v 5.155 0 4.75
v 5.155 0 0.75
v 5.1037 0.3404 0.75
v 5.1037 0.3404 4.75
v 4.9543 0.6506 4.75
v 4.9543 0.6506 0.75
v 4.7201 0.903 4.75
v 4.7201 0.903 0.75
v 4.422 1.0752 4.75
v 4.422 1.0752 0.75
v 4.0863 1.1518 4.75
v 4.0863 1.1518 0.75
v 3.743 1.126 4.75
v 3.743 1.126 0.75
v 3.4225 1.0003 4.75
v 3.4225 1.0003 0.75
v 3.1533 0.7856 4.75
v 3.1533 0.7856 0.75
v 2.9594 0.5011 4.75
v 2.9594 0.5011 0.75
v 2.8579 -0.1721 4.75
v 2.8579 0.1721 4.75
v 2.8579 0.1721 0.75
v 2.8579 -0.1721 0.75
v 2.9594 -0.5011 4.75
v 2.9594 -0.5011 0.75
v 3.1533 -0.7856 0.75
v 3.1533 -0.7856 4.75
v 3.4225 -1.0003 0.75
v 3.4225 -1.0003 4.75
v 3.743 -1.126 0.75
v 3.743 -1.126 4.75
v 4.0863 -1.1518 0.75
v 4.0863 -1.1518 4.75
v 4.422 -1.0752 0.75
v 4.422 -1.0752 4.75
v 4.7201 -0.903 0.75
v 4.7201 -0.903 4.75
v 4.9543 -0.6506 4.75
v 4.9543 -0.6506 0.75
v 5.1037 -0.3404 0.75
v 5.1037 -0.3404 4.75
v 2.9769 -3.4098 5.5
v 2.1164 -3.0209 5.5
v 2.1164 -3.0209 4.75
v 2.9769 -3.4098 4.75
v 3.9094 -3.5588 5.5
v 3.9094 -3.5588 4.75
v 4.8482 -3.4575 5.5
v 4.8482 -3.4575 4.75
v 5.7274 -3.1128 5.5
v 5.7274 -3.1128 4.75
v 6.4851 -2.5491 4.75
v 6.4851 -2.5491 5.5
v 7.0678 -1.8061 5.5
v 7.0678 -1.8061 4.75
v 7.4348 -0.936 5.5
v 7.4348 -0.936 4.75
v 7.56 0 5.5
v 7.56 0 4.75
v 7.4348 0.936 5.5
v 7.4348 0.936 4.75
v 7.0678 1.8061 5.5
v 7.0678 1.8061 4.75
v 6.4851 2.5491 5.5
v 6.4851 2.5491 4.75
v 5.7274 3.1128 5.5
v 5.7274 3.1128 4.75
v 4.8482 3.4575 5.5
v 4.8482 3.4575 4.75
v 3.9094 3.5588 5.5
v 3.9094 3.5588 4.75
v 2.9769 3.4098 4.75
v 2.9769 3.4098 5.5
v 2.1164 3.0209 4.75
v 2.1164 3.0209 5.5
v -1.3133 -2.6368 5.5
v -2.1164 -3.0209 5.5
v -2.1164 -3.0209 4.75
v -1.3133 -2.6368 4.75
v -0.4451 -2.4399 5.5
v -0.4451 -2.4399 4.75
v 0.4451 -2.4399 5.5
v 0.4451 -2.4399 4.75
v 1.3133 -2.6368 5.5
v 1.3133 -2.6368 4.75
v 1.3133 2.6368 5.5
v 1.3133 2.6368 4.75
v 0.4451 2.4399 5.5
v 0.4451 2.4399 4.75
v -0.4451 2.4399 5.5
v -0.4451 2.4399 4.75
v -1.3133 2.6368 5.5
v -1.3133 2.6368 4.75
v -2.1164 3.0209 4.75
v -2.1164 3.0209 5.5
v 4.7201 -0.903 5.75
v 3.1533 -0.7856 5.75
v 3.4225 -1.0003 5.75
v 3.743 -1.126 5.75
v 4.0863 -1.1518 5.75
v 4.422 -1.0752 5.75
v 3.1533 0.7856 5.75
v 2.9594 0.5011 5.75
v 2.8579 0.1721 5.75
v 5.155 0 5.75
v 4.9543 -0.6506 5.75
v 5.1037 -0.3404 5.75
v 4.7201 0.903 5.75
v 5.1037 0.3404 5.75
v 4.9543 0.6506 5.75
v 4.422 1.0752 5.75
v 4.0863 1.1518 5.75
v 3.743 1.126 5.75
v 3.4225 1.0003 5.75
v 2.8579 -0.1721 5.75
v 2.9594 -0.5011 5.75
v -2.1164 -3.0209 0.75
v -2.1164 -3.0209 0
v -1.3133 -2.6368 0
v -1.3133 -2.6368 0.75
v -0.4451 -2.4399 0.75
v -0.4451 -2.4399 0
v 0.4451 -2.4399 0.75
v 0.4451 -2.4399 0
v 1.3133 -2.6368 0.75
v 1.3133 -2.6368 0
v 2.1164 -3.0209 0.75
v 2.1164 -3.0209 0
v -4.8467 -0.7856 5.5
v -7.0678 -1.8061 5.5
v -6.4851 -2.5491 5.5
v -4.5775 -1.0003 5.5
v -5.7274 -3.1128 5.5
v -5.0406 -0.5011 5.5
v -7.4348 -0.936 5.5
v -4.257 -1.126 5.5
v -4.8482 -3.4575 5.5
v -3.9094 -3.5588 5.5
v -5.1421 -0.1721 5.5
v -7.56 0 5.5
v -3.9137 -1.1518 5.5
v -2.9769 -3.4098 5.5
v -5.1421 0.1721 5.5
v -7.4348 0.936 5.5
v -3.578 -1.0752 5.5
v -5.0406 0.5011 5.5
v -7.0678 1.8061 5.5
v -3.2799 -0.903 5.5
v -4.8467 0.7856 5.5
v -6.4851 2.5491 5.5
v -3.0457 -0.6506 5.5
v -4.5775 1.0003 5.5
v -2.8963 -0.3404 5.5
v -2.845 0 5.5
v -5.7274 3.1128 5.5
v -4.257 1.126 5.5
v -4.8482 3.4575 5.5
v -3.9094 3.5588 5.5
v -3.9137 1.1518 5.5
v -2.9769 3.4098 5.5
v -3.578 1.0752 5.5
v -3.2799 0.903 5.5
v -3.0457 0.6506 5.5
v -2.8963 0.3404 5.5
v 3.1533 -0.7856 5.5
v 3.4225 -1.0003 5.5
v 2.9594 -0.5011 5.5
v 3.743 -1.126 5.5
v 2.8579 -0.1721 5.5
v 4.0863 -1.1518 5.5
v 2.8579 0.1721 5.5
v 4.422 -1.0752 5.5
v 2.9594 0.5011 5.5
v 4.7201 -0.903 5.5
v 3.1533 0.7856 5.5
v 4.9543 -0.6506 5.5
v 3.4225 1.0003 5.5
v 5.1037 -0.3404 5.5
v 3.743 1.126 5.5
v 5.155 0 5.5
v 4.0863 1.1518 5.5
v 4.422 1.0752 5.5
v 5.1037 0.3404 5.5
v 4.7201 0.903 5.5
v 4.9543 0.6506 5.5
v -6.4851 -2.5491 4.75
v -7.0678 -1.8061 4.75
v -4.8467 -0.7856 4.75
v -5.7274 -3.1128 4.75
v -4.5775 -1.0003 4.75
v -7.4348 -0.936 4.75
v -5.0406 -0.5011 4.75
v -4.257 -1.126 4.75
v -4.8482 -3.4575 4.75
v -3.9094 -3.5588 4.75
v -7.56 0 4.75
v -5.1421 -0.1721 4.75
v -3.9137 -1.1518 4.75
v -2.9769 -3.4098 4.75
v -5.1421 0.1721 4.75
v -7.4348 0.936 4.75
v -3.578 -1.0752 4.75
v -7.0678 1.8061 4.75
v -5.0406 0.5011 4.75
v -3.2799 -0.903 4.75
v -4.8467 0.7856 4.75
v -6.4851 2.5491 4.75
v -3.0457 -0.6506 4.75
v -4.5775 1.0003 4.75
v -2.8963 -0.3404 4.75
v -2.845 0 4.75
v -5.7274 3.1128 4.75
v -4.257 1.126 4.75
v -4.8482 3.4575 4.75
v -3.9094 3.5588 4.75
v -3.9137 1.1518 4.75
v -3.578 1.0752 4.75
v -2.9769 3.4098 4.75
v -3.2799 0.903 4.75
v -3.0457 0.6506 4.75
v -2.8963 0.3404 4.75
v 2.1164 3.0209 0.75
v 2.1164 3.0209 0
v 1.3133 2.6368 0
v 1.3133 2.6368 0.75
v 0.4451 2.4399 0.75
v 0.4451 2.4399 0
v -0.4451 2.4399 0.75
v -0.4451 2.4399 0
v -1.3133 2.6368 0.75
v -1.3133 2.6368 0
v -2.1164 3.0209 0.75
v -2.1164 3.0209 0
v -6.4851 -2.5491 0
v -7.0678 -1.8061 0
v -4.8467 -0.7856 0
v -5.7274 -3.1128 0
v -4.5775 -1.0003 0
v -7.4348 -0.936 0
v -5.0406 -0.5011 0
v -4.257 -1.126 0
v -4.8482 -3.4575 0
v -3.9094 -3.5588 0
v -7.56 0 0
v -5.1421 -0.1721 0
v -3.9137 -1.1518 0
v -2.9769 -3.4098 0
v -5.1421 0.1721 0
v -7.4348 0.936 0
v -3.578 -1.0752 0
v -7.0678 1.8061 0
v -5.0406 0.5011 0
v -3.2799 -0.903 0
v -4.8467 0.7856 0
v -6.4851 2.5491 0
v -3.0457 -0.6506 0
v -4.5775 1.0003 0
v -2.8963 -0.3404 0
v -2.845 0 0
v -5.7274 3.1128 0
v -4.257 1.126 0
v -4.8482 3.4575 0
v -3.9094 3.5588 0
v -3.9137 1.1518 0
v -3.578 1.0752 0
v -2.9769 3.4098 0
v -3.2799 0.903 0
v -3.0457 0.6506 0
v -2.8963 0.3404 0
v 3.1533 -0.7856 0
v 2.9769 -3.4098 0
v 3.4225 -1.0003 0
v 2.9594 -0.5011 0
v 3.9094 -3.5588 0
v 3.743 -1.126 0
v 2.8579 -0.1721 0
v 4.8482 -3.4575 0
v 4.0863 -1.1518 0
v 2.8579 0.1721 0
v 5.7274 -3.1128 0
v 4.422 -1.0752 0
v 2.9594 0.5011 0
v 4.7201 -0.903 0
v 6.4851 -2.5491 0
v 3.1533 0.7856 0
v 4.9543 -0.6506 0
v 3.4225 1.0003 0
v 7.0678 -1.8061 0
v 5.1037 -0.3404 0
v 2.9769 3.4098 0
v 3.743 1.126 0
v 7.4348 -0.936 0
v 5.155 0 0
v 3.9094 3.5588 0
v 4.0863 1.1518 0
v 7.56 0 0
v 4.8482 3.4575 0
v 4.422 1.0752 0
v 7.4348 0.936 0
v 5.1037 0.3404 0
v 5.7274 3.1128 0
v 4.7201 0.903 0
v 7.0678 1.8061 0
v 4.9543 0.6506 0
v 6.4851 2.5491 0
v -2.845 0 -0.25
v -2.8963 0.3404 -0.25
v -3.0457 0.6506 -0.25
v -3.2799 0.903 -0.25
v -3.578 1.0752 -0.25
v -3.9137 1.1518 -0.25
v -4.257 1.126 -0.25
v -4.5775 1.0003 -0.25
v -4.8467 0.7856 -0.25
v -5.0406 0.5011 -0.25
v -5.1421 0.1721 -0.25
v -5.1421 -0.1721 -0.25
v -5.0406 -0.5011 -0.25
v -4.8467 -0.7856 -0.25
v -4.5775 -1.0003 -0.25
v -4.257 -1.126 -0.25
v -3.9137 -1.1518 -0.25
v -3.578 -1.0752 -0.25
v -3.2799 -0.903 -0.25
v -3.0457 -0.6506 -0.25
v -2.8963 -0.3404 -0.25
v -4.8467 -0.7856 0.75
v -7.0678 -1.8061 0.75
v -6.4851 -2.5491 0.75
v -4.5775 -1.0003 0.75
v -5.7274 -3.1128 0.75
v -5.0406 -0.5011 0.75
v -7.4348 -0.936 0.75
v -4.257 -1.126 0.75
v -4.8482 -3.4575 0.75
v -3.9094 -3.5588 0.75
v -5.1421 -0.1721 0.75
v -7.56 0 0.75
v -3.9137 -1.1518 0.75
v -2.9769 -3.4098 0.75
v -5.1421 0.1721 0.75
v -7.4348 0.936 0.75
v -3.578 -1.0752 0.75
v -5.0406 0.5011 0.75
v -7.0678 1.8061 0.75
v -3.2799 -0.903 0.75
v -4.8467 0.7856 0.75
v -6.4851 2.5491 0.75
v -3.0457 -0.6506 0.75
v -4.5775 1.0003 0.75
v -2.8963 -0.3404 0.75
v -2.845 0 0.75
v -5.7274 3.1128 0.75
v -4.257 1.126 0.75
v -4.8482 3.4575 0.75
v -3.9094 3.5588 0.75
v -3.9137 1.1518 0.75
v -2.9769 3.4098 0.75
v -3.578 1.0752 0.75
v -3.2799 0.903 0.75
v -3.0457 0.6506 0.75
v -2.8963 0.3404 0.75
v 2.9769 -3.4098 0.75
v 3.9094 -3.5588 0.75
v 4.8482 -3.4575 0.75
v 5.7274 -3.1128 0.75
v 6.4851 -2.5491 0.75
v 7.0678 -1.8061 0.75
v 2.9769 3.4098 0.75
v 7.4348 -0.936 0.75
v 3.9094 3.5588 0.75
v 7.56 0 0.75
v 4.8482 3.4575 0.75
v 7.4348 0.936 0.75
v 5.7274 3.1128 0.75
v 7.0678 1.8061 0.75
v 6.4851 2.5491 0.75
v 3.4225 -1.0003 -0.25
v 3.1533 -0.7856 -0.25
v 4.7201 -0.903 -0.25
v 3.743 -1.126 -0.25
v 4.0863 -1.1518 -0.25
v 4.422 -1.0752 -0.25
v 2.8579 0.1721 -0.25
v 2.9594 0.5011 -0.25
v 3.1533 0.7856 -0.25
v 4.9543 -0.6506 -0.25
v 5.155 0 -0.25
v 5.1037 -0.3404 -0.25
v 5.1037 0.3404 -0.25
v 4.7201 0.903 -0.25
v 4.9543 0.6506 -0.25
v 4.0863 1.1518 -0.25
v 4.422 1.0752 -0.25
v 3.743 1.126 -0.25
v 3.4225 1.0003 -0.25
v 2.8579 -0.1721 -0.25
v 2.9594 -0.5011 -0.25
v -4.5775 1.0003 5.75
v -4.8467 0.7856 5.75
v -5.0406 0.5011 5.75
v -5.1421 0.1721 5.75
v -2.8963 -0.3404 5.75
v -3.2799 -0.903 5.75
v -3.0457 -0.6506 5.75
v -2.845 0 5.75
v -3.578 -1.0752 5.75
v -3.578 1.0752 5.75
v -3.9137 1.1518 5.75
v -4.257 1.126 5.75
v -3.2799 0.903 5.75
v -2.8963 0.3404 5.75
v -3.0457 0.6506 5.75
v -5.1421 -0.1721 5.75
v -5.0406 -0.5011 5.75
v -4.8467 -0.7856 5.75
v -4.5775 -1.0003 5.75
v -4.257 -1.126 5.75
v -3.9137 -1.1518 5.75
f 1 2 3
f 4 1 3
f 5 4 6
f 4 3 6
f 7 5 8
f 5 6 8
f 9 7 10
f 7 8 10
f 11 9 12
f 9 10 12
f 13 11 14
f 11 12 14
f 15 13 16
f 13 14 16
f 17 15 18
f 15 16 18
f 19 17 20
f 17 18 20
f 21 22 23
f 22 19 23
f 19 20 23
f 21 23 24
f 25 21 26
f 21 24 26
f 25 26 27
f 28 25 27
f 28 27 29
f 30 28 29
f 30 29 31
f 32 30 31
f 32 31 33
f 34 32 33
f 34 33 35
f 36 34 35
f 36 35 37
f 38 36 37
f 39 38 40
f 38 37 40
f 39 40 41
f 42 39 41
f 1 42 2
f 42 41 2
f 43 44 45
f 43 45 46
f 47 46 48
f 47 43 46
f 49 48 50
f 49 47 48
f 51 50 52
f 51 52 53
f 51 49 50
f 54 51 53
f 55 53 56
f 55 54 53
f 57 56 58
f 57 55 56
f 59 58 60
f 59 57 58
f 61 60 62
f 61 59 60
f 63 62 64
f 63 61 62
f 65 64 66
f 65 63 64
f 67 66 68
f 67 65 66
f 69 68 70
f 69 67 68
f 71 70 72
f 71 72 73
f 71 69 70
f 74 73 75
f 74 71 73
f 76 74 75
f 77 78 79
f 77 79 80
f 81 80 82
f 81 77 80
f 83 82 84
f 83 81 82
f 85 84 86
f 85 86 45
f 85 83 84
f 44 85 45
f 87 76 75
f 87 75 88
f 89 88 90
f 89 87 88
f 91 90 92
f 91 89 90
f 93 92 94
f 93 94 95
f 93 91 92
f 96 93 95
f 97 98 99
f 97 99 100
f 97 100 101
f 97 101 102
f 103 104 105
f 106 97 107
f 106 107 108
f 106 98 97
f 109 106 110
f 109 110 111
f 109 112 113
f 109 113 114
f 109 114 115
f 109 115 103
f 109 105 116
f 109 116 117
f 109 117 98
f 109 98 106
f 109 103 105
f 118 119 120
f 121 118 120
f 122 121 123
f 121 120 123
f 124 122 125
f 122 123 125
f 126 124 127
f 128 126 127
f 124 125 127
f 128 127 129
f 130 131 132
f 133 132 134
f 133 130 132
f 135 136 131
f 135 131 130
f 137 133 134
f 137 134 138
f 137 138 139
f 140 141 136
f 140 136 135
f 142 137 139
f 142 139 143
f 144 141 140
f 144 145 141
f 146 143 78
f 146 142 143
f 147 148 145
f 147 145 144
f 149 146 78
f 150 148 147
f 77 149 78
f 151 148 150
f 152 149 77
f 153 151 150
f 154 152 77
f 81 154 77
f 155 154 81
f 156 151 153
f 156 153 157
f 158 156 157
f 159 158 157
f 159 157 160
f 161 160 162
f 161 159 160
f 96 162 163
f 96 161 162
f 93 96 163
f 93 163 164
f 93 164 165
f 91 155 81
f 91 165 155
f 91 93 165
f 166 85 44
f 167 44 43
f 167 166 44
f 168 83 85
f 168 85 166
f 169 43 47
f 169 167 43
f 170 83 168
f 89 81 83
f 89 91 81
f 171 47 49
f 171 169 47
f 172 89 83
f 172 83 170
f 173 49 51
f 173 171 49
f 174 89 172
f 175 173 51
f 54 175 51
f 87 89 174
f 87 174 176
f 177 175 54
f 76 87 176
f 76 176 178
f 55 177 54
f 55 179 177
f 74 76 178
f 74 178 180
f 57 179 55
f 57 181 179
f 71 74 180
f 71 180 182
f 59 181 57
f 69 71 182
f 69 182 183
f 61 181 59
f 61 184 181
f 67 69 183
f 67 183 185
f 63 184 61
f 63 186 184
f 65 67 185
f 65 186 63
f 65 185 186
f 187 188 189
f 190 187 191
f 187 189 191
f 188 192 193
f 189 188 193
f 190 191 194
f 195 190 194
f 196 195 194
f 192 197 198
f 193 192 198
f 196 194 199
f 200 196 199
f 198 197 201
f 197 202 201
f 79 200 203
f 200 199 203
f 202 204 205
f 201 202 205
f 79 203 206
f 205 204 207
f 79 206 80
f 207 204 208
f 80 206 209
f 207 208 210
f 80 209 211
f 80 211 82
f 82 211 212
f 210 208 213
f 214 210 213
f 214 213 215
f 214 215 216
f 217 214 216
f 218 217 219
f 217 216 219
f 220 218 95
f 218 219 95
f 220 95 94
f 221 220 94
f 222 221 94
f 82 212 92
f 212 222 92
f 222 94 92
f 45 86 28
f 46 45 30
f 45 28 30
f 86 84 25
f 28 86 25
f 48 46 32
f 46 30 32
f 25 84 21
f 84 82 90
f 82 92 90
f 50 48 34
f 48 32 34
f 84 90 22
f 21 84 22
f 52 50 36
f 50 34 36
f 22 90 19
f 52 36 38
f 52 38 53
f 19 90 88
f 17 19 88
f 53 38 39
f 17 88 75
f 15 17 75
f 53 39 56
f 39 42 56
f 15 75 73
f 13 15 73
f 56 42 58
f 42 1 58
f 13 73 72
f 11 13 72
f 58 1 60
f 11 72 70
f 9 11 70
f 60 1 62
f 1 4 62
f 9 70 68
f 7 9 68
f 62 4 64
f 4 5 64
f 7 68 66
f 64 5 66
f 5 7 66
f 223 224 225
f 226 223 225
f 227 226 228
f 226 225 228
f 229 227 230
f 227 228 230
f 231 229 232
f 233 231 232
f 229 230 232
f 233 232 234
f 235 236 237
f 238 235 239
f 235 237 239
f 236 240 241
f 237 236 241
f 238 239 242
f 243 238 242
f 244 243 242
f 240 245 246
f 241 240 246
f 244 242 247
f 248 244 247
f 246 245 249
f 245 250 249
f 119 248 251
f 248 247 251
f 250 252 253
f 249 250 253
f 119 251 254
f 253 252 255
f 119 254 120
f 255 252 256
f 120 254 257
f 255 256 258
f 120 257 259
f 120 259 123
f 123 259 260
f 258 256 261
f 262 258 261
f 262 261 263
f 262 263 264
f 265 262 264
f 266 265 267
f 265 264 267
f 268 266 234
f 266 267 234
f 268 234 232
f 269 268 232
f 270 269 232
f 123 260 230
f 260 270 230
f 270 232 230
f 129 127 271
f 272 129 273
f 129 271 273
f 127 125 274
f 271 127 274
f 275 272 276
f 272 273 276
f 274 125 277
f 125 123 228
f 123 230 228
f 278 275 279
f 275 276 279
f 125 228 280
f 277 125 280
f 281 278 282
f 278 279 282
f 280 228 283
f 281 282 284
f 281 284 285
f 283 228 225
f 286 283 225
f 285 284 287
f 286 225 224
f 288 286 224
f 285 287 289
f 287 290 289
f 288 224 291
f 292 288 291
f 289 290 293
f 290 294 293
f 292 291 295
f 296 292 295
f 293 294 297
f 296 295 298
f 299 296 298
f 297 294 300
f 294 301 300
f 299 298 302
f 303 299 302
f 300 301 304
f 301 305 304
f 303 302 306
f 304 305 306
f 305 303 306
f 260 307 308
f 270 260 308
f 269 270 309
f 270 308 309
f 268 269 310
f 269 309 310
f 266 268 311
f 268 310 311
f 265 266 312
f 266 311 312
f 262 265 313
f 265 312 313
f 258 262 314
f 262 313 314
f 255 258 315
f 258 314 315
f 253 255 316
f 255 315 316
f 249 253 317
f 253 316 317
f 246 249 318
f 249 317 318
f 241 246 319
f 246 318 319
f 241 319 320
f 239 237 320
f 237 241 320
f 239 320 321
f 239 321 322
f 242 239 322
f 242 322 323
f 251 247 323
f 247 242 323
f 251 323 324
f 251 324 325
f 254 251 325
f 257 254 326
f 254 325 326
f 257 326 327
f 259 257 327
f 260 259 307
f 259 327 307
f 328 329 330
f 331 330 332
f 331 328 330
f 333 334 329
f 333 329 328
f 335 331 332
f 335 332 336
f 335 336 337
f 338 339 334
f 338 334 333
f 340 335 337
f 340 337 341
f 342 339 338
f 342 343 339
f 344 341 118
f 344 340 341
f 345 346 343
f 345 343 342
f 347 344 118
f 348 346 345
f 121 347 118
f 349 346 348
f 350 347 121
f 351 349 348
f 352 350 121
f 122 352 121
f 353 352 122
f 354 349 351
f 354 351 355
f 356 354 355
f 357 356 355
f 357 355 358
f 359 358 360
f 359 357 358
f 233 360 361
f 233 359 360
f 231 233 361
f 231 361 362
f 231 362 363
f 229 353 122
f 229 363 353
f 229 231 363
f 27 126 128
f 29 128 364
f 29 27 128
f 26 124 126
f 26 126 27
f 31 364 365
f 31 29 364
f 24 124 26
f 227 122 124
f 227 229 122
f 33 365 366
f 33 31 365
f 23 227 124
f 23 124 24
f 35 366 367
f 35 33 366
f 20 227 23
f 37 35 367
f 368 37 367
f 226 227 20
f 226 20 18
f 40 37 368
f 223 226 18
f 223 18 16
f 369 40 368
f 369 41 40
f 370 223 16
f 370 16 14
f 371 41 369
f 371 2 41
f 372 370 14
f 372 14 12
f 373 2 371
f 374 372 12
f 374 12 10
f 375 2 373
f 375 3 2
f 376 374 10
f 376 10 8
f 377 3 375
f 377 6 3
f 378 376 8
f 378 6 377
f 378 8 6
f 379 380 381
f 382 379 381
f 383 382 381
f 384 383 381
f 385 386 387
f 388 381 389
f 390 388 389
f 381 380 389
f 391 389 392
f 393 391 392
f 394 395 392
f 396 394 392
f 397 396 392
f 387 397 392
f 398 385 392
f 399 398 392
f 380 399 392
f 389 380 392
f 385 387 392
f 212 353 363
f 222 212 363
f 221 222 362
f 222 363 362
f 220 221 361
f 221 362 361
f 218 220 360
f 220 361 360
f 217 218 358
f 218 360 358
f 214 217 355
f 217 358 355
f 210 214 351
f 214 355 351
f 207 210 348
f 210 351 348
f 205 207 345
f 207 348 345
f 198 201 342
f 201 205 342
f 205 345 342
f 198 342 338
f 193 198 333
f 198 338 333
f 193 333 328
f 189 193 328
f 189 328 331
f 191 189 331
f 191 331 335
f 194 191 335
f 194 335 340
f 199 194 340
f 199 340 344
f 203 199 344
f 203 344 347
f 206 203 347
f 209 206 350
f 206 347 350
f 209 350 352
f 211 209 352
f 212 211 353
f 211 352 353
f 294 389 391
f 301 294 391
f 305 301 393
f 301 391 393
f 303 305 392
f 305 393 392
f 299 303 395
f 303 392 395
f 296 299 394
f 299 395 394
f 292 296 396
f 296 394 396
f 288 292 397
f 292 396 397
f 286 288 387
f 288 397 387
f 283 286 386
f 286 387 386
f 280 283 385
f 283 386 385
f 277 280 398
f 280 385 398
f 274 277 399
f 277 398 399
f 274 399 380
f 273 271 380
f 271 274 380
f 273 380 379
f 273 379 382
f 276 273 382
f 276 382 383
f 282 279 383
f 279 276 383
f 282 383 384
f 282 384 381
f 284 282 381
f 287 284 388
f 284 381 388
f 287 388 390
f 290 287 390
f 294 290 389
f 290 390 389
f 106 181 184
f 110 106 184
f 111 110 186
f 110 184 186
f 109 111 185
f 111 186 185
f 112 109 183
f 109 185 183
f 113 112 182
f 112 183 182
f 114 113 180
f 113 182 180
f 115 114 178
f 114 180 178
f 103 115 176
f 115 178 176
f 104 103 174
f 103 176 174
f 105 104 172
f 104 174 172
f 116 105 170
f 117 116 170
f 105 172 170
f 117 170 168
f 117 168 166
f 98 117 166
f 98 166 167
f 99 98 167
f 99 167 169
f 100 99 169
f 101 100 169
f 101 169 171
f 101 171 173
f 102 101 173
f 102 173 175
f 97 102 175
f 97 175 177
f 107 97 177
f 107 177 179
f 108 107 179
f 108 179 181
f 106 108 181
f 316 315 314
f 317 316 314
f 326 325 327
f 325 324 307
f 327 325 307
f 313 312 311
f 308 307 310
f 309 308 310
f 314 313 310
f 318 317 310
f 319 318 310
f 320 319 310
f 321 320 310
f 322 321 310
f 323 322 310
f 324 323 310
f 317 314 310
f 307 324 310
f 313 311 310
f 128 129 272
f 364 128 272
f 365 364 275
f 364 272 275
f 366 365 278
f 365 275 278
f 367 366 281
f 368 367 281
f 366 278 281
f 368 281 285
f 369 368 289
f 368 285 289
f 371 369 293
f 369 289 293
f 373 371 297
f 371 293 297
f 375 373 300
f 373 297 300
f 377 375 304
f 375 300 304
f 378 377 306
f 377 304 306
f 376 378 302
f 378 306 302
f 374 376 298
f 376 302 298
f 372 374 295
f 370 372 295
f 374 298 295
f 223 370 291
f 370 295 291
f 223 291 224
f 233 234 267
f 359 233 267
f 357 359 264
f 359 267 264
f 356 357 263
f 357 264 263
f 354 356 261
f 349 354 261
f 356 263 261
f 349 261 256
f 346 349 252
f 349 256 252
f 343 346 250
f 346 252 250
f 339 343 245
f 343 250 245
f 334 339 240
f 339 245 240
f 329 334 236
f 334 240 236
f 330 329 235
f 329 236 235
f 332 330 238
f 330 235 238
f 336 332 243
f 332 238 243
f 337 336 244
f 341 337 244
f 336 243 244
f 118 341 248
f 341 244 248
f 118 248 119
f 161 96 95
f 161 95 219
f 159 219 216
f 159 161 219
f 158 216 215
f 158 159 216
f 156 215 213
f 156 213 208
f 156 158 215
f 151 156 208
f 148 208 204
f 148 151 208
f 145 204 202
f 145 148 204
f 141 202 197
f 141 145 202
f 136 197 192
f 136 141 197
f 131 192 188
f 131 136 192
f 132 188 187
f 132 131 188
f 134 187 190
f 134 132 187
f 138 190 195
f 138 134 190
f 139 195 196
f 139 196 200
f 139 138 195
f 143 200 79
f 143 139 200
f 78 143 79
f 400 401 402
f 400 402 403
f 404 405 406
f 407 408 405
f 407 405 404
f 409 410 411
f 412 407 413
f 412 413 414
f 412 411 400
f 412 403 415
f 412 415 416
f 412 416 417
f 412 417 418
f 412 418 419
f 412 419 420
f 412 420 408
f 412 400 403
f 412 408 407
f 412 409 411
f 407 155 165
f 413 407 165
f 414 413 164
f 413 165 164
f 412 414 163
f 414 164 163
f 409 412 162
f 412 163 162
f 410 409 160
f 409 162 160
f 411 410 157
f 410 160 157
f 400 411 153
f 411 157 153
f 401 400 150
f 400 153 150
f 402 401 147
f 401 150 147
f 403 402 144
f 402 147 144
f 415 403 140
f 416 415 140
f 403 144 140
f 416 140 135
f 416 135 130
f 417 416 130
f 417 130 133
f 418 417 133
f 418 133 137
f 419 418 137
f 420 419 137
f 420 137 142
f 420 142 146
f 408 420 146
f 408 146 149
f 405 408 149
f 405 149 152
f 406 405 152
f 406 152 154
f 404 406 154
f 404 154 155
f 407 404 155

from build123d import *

# Parameters (mm, degrees)
BOSS_EXTRUDE1_DEPTH      = 0.75
BOSS_EXTRUDE2_DEPTH      = 5
BOSS_EXTRUDE2_DEPTH_BACK = 1
SKETCH2_R                = 1.155


with BuildPart() as part:
    # Sketch1 → Boss-Extrude1 (new body)
    with BuildSketch(Plane.XY):
        with BuildLine():
            ThreePointArc((-2.116402116, 3.020870572), (-7.56, 0), (-2.116402116, -3.020870572))
            ThreePointArc((-2.116402116, -3.020870572), (0, -2.41510717), (2.116402116, -3.020870572))
            ThreePointArc((2.116402116, -3.020870572), (7.56, 0), (2.116402116, 3.020870572))
            ThreePointArc((2.116402116, 3.020870572), (0, 2.41510717), (-2.116402116, 3.020870572))
        make_face()
    boss_extrude1 = extrude(amount=BOSS_EXTRUDE1_DEPTH)

    # Sketch2 → Boss-Extrude2 (add, two sides: drawn at the far end of the back side and taken through both)
    with BuildSketch(Plane.XY.offset(0.75).offset(-BOSS_EXTRUDE2_DEPTH_BACK)):
        with Locations((-4, 0)):
            Circle(SKETCH2_R)
        with Locations((4, 0)):
            Circle(SKETCH2_R)
    extrude(amount=BOSS_EXTRUDE2_DEPTH + BOSS_EXTRUDE2_DEPTH_BACK)

    # Mirror1: Boss-Extrude1 across plane
    add(boss_extrude1.mirror(Plane.XY.offset(2.75)))


solid = part.part
